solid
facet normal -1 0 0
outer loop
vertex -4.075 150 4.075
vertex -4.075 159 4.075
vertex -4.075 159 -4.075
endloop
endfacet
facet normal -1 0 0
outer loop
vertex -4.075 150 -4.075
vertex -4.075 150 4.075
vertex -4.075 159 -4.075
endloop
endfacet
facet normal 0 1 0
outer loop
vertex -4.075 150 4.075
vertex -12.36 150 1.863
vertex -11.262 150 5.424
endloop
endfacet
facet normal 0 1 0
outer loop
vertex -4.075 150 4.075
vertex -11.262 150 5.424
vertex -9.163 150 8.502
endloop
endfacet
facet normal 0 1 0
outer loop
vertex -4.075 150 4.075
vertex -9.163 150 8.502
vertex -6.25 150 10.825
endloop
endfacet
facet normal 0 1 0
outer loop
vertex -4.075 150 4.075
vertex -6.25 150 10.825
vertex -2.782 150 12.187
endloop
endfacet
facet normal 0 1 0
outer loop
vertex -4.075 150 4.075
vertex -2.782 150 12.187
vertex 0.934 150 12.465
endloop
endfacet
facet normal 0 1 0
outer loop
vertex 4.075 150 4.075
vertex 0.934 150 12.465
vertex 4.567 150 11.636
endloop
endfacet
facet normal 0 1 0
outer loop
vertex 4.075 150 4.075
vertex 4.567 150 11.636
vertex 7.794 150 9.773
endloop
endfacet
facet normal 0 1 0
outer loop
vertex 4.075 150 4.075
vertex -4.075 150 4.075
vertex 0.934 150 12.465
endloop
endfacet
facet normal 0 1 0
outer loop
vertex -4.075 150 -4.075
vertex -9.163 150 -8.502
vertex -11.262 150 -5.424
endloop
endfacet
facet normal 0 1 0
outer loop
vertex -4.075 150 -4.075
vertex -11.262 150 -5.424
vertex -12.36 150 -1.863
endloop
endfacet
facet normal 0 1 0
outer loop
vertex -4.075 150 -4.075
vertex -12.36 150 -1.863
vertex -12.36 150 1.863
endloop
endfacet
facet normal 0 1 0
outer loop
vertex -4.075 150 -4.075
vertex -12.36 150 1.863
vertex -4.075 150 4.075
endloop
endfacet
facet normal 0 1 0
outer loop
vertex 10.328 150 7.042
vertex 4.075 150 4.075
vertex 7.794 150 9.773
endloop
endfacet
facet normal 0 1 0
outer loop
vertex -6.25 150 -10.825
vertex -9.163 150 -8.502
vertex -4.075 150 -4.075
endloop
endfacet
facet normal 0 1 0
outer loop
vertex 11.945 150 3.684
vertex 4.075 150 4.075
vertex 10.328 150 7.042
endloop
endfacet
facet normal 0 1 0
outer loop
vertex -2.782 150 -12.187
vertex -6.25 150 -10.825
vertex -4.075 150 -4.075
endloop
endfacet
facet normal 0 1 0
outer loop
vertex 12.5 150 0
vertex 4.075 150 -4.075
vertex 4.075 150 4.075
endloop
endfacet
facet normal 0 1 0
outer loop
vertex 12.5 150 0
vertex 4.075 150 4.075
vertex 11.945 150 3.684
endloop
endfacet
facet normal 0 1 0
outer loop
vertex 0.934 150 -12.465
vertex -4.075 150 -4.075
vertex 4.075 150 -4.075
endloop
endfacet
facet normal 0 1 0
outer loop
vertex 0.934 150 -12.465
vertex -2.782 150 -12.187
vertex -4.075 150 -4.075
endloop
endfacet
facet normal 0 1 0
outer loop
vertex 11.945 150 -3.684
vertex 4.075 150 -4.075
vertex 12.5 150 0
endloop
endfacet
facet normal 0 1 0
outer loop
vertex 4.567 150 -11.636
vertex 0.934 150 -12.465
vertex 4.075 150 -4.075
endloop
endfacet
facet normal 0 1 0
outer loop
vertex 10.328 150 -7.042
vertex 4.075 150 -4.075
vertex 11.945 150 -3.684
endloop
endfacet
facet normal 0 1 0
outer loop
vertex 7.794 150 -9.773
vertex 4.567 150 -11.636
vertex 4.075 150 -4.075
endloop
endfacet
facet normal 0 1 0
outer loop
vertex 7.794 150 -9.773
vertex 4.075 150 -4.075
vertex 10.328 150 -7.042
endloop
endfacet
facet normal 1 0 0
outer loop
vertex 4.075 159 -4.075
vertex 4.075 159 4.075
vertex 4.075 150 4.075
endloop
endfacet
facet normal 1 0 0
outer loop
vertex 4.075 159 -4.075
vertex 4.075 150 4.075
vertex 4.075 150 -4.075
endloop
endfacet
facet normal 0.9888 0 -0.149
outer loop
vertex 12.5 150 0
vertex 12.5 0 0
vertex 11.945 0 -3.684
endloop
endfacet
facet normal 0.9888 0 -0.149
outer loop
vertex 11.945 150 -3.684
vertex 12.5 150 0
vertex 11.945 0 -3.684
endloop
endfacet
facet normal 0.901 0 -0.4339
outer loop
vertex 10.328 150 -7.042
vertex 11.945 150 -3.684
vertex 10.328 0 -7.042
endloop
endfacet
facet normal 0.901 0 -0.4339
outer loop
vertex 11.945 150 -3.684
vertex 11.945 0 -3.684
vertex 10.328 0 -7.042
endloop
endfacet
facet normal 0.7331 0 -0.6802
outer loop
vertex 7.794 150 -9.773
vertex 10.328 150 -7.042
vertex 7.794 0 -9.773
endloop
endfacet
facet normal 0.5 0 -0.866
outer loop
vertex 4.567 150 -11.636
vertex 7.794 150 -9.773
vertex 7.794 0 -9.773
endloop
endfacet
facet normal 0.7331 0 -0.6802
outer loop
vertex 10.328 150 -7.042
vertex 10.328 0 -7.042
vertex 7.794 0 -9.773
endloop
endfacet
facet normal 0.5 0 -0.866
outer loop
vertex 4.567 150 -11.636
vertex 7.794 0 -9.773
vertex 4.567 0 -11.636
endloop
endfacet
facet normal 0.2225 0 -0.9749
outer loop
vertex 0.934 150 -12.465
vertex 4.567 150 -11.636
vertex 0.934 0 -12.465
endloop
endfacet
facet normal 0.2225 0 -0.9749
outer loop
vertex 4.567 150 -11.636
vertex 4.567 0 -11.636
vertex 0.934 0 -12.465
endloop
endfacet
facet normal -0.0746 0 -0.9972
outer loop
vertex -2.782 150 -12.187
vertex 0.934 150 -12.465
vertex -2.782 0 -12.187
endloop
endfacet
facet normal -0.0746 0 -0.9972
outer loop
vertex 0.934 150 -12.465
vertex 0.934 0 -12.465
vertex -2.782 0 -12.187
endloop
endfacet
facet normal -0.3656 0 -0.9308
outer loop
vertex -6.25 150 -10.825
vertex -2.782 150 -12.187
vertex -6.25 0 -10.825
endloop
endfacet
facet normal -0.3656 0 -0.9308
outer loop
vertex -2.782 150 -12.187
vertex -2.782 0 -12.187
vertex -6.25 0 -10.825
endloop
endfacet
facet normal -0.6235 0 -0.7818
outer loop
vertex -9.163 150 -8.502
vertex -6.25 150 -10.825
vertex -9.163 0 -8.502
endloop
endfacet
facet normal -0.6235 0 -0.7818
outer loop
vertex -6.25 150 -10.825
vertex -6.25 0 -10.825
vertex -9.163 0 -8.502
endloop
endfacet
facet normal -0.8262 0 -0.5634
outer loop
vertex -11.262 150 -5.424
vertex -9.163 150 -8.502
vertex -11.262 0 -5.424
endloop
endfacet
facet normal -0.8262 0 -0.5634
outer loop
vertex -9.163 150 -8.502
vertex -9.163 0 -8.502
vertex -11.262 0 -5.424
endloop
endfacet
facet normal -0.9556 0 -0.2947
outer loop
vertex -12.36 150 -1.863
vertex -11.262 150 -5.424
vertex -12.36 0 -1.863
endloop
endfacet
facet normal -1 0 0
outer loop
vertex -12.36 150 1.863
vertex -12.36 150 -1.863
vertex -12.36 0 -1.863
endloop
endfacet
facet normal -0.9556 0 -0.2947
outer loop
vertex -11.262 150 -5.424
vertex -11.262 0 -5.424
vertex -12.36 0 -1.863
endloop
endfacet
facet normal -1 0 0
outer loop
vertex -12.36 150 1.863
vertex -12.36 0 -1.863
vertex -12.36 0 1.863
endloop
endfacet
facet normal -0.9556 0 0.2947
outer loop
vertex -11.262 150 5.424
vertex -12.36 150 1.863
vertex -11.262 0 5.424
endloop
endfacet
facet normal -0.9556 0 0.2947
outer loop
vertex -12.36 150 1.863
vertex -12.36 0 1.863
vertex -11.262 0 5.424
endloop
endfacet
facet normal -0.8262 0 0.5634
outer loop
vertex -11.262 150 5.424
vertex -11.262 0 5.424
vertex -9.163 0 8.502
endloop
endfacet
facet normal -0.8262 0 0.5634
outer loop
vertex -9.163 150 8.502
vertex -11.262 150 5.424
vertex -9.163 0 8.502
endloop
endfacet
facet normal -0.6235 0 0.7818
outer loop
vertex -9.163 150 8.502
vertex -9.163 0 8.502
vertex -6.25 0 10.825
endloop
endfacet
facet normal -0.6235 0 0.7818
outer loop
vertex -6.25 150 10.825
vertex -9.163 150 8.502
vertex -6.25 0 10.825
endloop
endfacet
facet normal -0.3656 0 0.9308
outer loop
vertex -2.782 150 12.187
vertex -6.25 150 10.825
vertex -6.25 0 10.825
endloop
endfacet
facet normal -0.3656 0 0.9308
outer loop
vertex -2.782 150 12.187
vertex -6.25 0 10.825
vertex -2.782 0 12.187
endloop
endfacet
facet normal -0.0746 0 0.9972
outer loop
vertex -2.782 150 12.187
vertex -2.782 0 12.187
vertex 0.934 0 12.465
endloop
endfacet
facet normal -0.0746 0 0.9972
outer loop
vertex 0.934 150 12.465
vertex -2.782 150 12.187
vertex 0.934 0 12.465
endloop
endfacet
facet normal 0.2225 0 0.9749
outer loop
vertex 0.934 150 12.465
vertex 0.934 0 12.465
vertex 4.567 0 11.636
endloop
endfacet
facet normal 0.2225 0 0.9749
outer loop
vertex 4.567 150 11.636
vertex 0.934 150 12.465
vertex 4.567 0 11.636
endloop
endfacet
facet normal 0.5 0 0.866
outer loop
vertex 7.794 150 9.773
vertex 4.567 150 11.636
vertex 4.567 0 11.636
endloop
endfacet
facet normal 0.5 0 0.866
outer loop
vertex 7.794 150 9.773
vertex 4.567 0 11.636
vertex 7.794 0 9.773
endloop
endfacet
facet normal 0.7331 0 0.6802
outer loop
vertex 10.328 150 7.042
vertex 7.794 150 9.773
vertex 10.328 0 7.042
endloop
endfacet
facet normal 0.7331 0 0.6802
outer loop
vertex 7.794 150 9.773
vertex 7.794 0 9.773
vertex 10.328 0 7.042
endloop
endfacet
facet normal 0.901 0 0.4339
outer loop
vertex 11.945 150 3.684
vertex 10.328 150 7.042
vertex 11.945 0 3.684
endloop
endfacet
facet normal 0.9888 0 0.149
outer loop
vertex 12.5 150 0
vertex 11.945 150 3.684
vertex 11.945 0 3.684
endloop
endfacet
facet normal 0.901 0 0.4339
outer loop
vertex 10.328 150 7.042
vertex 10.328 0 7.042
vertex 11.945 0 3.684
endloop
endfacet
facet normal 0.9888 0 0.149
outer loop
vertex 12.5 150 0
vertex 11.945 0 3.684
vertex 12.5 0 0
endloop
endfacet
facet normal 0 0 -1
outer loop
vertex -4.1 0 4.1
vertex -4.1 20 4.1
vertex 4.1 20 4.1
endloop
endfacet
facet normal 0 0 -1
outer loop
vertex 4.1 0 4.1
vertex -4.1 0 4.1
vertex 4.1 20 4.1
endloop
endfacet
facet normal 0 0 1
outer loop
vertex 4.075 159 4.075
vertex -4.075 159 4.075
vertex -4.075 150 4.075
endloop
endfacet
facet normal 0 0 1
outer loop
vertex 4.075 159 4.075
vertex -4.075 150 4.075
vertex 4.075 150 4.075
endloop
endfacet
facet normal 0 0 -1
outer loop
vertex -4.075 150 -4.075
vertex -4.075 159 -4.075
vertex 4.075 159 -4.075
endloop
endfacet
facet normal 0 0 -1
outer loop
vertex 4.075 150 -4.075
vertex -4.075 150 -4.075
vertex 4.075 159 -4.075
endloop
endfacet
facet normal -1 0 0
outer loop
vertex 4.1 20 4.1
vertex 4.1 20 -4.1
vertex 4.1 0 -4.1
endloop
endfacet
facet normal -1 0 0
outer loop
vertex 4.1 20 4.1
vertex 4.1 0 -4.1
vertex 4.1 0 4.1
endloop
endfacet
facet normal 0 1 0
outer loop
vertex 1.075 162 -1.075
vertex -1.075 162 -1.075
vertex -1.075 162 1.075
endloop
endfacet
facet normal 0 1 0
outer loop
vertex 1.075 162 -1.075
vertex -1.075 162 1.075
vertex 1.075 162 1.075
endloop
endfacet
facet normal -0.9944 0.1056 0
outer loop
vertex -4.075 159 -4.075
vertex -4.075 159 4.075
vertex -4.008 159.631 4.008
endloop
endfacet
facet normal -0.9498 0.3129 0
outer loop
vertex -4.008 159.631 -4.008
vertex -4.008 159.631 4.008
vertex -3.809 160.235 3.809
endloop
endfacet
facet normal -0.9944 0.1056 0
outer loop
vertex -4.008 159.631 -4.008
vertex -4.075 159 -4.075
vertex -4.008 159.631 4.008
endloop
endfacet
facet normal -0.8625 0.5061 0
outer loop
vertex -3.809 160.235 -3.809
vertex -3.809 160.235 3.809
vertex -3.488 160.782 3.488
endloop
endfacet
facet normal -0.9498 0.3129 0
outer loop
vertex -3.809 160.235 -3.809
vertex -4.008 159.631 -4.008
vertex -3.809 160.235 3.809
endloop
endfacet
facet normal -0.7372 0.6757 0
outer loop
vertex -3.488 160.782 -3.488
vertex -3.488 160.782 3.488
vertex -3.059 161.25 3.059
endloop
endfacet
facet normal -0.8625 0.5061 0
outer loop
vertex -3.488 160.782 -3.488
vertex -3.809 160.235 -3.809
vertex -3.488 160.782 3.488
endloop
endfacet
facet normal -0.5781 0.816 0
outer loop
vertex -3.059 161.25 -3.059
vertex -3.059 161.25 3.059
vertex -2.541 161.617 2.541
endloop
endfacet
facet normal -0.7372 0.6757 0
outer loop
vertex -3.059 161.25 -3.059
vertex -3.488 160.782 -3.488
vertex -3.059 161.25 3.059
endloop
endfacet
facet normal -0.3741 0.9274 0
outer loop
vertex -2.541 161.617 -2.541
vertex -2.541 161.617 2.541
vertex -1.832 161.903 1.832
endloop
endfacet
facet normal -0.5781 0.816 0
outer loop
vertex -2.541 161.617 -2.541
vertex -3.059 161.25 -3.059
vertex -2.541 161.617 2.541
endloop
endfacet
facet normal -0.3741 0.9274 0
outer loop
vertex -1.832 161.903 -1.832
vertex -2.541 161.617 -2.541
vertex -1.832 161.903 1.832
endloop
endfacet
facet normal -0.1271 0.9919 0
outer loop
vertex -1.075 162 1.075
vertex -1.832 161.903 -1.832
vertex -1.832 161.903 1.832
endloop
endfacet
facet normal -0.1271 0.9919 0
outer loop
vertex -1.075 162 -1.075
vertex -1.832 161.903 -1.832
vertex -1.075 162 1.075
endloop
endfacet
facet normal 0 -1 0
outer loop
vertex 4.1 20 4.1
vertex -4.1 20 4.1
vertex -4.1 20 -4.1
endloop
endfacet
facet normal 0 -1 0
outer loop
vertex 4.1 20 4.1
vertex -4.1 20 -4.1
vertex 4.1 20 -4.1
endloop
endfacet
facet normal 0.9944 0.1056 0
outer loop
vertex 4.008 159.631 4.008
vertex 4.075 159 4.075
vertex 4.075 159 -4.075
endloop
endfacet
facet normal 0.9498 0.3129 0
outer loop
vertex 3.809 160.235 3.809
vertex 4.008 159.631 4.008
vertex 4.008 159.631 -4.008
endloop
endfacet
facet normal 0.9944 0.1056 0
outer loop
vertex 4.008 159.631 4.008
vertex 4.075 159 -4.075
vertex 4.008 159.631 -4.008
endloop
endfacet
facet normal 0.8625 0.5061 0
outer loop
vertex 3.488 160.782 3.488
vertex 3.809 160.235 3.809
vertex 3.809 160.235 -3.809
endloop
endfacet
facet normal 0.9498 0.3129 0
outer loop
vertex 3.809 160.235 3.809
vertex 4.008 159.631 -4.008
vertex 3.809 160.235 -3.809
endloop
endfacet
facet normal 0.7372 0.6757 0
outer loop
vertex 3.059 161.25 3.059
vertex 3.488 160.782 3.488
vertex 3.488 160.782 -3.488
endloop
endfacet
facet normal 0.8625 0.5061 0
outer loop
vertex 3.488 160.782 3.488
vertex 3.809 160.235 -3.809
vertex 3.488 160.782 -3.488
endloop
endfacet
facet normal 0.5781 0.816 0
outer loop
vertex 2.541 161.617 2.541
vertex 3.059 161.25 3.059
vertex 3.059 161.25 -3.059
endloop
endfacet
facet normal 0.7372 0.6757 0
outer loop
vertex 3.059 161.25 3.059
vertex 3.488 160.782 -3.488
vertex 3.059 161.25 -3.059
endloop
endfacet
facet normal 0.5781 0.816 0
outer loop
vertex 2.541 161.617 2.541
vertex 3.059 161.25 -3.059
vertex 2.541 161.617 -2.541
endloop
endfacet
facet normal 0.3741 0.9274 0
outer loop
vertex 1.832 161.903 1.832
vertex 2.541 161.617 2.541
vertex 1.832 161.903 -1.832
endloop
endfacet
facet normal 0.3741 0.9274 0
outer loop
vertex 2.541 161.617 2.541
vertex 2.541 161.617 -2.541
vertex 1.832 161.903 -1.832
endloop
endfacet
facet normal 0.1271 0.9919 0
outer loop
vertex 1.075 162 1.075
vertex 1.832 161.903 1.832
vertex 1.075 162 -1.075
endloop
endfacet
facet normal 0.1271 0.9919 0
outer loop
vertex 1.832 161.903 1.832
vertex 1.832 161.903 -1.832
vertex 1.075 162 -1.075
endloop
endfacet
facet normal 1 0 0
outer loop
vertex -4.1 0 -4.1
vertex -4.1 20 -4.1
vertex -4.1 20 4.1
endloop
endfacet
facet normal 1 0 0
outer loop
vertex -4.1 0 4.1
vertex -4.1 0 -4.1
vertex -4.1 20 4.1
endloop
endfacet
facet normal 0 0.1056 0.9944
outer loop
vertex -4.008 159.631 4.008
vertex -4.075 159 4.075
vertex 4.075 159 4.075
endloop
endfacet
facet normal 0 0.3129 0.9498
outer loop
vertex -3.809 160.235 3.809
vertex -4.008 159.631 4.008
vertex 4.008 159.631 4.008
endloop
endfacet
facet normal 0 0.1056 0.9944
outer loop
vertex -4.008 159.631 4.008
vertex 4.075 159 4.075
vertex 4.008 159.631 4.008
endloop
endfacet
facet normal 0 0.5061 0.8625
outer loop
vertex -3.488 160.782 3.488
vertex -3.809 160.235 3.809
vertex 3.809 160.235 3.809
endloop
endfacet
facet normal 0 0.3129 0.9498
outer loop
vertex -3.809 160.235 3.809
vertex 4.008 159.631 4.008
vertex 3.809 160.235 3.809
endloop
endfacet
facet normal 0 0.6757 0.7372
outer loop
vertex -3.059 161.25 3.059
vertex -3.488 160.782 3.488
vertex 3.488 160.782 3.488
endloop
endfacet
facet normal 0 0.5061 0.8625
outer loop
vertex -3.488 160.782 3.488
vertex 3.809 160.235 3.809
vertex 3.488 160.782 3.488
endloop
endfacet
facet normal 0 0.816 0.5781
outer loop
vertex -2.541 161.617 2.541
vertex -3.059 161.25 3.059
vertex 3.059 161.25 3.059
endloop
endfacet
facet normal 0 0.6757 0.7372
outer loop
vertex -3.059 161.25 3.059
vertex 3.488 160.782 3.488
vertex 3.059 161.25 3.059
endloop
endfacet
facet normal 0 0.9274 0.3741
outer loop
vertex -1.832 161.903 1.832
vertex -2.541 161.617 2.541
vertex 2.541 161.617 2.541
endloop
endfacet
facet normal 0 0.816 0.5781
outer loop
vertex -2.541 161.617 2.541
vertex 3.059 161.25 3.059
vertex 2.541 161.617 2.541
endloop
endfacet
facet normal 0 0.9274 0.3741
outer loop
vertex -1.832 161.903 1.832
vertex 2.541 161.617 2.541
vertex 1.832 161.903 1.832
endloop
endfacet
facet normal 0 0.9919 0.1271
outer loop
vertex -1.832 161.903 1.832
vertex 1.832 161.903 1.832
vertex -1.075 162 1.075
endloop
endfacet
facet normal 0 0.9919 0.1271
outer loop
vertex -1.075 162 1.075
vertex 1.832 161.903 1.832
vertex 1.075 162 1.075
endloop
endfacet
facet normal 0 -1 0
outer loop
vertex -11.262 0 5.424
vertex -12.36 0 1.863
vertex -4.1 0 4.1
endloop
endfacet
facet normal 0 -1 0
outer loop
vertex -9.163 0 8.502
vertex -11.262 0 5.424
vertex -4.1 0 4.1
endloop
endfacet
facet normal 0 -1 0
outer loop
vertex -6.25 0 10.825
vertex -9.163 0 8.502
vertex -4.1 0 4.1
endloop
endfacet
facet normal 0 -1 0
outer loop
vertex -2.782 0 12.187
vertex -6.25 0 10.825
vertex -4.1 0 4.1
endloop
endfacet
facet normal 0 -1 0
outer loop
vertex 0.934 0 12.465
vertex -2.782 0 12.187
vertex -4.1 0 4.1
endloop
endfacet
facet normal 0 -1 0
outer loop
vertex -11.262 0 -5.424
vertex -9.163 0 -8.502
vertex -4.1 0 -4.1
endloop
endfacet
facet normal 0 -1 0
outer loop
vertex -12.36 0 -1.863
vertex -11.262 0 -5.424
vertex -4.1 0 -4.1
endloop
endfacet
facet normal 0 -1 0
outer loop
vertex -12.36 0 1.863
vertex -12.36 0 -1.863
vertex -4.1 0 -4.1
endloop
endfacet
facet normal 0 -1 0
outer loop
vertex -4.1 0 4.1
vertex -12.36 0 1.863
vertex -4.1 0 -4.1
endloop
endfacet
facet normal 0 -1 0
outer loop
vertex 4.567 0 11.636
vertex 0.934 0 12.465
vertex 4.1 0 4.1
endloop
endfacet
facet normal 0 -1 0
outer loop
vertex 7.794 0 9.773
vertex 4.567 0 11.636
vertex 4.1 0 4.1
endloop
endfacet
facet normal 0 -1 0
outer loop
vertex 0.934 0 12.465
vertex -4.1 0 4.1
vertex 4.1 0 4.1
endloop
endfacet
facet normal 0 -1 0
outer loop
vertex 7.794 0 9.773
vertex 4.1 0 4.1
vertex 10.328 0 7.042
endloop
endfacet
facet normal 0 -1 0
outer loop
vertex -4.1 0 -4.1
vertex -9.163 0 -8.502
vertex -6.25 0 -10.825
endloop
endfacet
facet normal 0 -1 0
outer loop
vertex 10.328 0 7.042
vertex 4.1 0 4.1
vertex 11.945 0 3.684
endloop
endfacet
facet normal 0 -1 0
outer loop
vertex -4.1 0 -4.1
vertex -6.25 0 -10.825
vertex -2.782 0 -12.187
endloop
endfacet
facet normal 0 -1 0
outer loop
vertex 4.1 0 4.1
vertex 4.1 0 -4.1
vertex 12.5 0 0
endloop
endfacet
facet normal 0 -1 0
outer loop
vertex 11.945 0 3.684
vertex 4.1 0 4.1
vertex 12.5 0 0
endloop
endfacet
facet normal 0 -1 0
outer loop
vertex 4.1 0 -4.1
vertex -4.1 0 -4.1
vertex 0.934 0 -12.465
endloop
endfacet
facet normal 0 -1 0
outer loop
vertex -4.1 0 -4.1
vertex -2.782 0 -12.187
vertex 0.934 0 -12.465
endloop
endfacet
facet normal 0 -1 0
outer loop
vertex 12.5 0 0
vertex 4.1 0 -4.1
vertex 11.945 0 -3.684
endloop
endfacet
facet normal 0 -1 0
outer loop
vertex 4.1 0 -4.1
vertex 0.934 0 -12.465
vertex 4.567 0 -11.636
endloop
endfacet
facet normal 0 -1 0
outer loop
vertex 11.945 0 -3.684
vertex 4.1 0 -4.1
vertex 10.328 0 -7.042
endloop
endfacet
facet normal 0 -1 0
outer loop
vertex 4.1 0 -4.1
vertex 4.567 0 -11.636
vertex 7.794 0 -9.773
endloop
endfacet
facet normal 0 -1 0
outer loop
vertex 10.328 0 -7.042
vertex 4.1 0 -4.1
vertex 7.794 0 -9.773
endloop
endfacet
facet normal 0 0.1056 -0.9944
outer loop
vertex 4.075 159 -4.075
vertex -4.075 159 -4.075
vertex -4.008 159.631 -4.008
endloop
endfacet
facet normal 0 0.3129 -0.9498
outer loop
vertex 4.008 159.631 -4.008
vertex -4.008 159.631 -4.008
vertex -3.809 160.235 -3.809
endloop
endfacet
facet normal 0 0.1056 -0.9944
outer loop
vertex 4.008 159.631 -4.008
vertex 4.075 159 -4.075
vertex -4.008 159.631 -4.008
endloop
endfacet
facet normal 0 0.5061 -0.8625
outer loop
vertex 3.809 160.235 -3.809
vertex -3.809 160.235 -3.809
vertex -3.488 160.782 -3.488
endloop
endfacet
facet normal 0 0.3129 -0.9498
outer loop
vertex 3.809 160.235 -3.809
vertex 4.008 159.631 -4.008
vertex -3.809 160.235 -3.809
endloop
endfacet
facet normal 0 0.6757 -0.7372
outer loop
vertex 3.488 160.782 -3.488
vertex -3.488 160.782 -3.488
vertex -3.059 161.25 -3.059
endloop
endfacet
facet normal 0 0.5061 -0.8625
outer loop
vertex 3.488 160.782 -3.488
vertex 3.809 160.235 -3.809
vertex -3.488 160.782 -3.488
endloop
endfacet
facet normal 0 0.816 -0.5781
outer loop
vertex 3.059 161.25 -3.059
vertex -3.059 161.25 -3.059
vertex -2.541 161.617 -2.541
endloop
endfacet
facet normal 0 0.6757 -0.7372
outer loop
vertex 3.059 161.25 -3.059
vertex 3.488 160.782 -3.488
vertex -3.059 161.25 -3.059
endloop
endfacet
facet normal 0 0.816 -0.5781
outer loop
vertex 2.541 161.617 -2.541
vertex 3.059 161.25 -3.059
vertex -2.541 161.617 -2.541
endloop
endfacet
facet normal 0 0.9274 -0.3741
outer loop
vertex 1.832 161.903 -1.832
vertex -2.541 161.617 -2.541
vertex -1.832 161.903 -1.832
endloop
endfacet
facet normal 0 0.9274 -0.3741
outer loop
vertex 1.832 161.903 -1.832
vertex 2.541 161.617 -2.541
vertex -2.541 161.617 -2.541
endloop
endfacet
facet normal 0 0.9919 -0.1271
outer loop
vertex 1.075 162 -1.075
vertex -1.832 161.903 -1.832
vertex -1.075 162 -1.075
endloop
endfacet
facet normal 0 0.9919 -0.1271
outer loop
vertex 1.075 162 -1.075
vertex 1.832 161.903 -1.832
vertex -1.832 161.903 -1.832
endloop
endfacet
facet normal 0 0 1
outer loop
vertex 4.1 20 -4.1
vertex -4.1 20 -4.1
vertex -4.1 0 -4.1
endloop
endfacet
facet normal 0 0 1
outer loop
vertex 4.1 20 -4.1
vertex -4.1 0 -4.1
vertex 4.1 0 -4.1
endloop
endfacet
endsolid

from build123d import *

# Parameters (mm, degrees)
SKETCH1_R           = 12.5
BOSS_EXTRUDE1_DEPTH = 150
SKETCH2_W           = 8.15
SKETCH2_H           = 8.15
BOSS_EXTRUDE2_DEPTH = 12
FILLET1_R           = 3
SKETCH3_W           = 8.2
SKETCH3_H           = 8.2
CUT_EXTRUDE1_DEPTH  = 20


with BuildPart() as part:
    # Sketch1 → Boss-Extrude1 (new body)
    with BuildSketch(Plane(origin=(0, 0, 0), x_dir=(1, 0, 0), z_dir=(0, 1, 0))):
        Circle(SKETCH1_R)
    extrude(amount=BOSS_EXTRUDE1_DEPTH)

    # Sketch2 → Boss-Extrude2 (add)
    with BuildSketch(Plane(origin=(0, 150, 0), x_dir=(1, 0, 0), z_dir=(0, 1, 0))):
        Rectangle(SKETCH2_W, SKETCH2_H)
    extrude(amount=BOSS_EXTRUDE2_DEPTH)

    # Fillet1
    fillet1_edges = [part.edges().sort_by_distance(p)[0] for p in [
        (4.075, 162, 0),
        (0, 162, -4.075),
        (-4.075, 162, 0),
        (0, 162, 4.075),
    ]]
    fillet(fillet1_edges, radius=FILLET1_R)

    # Sketch3 → Cut-Extrude1 (cut)
    with BuildSketch(Plane.XZ):
        Rectangle(SKETCH3_W, SKETCH3_H)
    extrude(amount=-CUT_EXTRUDE1_DEPTH, mode=Mode.SUBTRACT)


solid = part.part
